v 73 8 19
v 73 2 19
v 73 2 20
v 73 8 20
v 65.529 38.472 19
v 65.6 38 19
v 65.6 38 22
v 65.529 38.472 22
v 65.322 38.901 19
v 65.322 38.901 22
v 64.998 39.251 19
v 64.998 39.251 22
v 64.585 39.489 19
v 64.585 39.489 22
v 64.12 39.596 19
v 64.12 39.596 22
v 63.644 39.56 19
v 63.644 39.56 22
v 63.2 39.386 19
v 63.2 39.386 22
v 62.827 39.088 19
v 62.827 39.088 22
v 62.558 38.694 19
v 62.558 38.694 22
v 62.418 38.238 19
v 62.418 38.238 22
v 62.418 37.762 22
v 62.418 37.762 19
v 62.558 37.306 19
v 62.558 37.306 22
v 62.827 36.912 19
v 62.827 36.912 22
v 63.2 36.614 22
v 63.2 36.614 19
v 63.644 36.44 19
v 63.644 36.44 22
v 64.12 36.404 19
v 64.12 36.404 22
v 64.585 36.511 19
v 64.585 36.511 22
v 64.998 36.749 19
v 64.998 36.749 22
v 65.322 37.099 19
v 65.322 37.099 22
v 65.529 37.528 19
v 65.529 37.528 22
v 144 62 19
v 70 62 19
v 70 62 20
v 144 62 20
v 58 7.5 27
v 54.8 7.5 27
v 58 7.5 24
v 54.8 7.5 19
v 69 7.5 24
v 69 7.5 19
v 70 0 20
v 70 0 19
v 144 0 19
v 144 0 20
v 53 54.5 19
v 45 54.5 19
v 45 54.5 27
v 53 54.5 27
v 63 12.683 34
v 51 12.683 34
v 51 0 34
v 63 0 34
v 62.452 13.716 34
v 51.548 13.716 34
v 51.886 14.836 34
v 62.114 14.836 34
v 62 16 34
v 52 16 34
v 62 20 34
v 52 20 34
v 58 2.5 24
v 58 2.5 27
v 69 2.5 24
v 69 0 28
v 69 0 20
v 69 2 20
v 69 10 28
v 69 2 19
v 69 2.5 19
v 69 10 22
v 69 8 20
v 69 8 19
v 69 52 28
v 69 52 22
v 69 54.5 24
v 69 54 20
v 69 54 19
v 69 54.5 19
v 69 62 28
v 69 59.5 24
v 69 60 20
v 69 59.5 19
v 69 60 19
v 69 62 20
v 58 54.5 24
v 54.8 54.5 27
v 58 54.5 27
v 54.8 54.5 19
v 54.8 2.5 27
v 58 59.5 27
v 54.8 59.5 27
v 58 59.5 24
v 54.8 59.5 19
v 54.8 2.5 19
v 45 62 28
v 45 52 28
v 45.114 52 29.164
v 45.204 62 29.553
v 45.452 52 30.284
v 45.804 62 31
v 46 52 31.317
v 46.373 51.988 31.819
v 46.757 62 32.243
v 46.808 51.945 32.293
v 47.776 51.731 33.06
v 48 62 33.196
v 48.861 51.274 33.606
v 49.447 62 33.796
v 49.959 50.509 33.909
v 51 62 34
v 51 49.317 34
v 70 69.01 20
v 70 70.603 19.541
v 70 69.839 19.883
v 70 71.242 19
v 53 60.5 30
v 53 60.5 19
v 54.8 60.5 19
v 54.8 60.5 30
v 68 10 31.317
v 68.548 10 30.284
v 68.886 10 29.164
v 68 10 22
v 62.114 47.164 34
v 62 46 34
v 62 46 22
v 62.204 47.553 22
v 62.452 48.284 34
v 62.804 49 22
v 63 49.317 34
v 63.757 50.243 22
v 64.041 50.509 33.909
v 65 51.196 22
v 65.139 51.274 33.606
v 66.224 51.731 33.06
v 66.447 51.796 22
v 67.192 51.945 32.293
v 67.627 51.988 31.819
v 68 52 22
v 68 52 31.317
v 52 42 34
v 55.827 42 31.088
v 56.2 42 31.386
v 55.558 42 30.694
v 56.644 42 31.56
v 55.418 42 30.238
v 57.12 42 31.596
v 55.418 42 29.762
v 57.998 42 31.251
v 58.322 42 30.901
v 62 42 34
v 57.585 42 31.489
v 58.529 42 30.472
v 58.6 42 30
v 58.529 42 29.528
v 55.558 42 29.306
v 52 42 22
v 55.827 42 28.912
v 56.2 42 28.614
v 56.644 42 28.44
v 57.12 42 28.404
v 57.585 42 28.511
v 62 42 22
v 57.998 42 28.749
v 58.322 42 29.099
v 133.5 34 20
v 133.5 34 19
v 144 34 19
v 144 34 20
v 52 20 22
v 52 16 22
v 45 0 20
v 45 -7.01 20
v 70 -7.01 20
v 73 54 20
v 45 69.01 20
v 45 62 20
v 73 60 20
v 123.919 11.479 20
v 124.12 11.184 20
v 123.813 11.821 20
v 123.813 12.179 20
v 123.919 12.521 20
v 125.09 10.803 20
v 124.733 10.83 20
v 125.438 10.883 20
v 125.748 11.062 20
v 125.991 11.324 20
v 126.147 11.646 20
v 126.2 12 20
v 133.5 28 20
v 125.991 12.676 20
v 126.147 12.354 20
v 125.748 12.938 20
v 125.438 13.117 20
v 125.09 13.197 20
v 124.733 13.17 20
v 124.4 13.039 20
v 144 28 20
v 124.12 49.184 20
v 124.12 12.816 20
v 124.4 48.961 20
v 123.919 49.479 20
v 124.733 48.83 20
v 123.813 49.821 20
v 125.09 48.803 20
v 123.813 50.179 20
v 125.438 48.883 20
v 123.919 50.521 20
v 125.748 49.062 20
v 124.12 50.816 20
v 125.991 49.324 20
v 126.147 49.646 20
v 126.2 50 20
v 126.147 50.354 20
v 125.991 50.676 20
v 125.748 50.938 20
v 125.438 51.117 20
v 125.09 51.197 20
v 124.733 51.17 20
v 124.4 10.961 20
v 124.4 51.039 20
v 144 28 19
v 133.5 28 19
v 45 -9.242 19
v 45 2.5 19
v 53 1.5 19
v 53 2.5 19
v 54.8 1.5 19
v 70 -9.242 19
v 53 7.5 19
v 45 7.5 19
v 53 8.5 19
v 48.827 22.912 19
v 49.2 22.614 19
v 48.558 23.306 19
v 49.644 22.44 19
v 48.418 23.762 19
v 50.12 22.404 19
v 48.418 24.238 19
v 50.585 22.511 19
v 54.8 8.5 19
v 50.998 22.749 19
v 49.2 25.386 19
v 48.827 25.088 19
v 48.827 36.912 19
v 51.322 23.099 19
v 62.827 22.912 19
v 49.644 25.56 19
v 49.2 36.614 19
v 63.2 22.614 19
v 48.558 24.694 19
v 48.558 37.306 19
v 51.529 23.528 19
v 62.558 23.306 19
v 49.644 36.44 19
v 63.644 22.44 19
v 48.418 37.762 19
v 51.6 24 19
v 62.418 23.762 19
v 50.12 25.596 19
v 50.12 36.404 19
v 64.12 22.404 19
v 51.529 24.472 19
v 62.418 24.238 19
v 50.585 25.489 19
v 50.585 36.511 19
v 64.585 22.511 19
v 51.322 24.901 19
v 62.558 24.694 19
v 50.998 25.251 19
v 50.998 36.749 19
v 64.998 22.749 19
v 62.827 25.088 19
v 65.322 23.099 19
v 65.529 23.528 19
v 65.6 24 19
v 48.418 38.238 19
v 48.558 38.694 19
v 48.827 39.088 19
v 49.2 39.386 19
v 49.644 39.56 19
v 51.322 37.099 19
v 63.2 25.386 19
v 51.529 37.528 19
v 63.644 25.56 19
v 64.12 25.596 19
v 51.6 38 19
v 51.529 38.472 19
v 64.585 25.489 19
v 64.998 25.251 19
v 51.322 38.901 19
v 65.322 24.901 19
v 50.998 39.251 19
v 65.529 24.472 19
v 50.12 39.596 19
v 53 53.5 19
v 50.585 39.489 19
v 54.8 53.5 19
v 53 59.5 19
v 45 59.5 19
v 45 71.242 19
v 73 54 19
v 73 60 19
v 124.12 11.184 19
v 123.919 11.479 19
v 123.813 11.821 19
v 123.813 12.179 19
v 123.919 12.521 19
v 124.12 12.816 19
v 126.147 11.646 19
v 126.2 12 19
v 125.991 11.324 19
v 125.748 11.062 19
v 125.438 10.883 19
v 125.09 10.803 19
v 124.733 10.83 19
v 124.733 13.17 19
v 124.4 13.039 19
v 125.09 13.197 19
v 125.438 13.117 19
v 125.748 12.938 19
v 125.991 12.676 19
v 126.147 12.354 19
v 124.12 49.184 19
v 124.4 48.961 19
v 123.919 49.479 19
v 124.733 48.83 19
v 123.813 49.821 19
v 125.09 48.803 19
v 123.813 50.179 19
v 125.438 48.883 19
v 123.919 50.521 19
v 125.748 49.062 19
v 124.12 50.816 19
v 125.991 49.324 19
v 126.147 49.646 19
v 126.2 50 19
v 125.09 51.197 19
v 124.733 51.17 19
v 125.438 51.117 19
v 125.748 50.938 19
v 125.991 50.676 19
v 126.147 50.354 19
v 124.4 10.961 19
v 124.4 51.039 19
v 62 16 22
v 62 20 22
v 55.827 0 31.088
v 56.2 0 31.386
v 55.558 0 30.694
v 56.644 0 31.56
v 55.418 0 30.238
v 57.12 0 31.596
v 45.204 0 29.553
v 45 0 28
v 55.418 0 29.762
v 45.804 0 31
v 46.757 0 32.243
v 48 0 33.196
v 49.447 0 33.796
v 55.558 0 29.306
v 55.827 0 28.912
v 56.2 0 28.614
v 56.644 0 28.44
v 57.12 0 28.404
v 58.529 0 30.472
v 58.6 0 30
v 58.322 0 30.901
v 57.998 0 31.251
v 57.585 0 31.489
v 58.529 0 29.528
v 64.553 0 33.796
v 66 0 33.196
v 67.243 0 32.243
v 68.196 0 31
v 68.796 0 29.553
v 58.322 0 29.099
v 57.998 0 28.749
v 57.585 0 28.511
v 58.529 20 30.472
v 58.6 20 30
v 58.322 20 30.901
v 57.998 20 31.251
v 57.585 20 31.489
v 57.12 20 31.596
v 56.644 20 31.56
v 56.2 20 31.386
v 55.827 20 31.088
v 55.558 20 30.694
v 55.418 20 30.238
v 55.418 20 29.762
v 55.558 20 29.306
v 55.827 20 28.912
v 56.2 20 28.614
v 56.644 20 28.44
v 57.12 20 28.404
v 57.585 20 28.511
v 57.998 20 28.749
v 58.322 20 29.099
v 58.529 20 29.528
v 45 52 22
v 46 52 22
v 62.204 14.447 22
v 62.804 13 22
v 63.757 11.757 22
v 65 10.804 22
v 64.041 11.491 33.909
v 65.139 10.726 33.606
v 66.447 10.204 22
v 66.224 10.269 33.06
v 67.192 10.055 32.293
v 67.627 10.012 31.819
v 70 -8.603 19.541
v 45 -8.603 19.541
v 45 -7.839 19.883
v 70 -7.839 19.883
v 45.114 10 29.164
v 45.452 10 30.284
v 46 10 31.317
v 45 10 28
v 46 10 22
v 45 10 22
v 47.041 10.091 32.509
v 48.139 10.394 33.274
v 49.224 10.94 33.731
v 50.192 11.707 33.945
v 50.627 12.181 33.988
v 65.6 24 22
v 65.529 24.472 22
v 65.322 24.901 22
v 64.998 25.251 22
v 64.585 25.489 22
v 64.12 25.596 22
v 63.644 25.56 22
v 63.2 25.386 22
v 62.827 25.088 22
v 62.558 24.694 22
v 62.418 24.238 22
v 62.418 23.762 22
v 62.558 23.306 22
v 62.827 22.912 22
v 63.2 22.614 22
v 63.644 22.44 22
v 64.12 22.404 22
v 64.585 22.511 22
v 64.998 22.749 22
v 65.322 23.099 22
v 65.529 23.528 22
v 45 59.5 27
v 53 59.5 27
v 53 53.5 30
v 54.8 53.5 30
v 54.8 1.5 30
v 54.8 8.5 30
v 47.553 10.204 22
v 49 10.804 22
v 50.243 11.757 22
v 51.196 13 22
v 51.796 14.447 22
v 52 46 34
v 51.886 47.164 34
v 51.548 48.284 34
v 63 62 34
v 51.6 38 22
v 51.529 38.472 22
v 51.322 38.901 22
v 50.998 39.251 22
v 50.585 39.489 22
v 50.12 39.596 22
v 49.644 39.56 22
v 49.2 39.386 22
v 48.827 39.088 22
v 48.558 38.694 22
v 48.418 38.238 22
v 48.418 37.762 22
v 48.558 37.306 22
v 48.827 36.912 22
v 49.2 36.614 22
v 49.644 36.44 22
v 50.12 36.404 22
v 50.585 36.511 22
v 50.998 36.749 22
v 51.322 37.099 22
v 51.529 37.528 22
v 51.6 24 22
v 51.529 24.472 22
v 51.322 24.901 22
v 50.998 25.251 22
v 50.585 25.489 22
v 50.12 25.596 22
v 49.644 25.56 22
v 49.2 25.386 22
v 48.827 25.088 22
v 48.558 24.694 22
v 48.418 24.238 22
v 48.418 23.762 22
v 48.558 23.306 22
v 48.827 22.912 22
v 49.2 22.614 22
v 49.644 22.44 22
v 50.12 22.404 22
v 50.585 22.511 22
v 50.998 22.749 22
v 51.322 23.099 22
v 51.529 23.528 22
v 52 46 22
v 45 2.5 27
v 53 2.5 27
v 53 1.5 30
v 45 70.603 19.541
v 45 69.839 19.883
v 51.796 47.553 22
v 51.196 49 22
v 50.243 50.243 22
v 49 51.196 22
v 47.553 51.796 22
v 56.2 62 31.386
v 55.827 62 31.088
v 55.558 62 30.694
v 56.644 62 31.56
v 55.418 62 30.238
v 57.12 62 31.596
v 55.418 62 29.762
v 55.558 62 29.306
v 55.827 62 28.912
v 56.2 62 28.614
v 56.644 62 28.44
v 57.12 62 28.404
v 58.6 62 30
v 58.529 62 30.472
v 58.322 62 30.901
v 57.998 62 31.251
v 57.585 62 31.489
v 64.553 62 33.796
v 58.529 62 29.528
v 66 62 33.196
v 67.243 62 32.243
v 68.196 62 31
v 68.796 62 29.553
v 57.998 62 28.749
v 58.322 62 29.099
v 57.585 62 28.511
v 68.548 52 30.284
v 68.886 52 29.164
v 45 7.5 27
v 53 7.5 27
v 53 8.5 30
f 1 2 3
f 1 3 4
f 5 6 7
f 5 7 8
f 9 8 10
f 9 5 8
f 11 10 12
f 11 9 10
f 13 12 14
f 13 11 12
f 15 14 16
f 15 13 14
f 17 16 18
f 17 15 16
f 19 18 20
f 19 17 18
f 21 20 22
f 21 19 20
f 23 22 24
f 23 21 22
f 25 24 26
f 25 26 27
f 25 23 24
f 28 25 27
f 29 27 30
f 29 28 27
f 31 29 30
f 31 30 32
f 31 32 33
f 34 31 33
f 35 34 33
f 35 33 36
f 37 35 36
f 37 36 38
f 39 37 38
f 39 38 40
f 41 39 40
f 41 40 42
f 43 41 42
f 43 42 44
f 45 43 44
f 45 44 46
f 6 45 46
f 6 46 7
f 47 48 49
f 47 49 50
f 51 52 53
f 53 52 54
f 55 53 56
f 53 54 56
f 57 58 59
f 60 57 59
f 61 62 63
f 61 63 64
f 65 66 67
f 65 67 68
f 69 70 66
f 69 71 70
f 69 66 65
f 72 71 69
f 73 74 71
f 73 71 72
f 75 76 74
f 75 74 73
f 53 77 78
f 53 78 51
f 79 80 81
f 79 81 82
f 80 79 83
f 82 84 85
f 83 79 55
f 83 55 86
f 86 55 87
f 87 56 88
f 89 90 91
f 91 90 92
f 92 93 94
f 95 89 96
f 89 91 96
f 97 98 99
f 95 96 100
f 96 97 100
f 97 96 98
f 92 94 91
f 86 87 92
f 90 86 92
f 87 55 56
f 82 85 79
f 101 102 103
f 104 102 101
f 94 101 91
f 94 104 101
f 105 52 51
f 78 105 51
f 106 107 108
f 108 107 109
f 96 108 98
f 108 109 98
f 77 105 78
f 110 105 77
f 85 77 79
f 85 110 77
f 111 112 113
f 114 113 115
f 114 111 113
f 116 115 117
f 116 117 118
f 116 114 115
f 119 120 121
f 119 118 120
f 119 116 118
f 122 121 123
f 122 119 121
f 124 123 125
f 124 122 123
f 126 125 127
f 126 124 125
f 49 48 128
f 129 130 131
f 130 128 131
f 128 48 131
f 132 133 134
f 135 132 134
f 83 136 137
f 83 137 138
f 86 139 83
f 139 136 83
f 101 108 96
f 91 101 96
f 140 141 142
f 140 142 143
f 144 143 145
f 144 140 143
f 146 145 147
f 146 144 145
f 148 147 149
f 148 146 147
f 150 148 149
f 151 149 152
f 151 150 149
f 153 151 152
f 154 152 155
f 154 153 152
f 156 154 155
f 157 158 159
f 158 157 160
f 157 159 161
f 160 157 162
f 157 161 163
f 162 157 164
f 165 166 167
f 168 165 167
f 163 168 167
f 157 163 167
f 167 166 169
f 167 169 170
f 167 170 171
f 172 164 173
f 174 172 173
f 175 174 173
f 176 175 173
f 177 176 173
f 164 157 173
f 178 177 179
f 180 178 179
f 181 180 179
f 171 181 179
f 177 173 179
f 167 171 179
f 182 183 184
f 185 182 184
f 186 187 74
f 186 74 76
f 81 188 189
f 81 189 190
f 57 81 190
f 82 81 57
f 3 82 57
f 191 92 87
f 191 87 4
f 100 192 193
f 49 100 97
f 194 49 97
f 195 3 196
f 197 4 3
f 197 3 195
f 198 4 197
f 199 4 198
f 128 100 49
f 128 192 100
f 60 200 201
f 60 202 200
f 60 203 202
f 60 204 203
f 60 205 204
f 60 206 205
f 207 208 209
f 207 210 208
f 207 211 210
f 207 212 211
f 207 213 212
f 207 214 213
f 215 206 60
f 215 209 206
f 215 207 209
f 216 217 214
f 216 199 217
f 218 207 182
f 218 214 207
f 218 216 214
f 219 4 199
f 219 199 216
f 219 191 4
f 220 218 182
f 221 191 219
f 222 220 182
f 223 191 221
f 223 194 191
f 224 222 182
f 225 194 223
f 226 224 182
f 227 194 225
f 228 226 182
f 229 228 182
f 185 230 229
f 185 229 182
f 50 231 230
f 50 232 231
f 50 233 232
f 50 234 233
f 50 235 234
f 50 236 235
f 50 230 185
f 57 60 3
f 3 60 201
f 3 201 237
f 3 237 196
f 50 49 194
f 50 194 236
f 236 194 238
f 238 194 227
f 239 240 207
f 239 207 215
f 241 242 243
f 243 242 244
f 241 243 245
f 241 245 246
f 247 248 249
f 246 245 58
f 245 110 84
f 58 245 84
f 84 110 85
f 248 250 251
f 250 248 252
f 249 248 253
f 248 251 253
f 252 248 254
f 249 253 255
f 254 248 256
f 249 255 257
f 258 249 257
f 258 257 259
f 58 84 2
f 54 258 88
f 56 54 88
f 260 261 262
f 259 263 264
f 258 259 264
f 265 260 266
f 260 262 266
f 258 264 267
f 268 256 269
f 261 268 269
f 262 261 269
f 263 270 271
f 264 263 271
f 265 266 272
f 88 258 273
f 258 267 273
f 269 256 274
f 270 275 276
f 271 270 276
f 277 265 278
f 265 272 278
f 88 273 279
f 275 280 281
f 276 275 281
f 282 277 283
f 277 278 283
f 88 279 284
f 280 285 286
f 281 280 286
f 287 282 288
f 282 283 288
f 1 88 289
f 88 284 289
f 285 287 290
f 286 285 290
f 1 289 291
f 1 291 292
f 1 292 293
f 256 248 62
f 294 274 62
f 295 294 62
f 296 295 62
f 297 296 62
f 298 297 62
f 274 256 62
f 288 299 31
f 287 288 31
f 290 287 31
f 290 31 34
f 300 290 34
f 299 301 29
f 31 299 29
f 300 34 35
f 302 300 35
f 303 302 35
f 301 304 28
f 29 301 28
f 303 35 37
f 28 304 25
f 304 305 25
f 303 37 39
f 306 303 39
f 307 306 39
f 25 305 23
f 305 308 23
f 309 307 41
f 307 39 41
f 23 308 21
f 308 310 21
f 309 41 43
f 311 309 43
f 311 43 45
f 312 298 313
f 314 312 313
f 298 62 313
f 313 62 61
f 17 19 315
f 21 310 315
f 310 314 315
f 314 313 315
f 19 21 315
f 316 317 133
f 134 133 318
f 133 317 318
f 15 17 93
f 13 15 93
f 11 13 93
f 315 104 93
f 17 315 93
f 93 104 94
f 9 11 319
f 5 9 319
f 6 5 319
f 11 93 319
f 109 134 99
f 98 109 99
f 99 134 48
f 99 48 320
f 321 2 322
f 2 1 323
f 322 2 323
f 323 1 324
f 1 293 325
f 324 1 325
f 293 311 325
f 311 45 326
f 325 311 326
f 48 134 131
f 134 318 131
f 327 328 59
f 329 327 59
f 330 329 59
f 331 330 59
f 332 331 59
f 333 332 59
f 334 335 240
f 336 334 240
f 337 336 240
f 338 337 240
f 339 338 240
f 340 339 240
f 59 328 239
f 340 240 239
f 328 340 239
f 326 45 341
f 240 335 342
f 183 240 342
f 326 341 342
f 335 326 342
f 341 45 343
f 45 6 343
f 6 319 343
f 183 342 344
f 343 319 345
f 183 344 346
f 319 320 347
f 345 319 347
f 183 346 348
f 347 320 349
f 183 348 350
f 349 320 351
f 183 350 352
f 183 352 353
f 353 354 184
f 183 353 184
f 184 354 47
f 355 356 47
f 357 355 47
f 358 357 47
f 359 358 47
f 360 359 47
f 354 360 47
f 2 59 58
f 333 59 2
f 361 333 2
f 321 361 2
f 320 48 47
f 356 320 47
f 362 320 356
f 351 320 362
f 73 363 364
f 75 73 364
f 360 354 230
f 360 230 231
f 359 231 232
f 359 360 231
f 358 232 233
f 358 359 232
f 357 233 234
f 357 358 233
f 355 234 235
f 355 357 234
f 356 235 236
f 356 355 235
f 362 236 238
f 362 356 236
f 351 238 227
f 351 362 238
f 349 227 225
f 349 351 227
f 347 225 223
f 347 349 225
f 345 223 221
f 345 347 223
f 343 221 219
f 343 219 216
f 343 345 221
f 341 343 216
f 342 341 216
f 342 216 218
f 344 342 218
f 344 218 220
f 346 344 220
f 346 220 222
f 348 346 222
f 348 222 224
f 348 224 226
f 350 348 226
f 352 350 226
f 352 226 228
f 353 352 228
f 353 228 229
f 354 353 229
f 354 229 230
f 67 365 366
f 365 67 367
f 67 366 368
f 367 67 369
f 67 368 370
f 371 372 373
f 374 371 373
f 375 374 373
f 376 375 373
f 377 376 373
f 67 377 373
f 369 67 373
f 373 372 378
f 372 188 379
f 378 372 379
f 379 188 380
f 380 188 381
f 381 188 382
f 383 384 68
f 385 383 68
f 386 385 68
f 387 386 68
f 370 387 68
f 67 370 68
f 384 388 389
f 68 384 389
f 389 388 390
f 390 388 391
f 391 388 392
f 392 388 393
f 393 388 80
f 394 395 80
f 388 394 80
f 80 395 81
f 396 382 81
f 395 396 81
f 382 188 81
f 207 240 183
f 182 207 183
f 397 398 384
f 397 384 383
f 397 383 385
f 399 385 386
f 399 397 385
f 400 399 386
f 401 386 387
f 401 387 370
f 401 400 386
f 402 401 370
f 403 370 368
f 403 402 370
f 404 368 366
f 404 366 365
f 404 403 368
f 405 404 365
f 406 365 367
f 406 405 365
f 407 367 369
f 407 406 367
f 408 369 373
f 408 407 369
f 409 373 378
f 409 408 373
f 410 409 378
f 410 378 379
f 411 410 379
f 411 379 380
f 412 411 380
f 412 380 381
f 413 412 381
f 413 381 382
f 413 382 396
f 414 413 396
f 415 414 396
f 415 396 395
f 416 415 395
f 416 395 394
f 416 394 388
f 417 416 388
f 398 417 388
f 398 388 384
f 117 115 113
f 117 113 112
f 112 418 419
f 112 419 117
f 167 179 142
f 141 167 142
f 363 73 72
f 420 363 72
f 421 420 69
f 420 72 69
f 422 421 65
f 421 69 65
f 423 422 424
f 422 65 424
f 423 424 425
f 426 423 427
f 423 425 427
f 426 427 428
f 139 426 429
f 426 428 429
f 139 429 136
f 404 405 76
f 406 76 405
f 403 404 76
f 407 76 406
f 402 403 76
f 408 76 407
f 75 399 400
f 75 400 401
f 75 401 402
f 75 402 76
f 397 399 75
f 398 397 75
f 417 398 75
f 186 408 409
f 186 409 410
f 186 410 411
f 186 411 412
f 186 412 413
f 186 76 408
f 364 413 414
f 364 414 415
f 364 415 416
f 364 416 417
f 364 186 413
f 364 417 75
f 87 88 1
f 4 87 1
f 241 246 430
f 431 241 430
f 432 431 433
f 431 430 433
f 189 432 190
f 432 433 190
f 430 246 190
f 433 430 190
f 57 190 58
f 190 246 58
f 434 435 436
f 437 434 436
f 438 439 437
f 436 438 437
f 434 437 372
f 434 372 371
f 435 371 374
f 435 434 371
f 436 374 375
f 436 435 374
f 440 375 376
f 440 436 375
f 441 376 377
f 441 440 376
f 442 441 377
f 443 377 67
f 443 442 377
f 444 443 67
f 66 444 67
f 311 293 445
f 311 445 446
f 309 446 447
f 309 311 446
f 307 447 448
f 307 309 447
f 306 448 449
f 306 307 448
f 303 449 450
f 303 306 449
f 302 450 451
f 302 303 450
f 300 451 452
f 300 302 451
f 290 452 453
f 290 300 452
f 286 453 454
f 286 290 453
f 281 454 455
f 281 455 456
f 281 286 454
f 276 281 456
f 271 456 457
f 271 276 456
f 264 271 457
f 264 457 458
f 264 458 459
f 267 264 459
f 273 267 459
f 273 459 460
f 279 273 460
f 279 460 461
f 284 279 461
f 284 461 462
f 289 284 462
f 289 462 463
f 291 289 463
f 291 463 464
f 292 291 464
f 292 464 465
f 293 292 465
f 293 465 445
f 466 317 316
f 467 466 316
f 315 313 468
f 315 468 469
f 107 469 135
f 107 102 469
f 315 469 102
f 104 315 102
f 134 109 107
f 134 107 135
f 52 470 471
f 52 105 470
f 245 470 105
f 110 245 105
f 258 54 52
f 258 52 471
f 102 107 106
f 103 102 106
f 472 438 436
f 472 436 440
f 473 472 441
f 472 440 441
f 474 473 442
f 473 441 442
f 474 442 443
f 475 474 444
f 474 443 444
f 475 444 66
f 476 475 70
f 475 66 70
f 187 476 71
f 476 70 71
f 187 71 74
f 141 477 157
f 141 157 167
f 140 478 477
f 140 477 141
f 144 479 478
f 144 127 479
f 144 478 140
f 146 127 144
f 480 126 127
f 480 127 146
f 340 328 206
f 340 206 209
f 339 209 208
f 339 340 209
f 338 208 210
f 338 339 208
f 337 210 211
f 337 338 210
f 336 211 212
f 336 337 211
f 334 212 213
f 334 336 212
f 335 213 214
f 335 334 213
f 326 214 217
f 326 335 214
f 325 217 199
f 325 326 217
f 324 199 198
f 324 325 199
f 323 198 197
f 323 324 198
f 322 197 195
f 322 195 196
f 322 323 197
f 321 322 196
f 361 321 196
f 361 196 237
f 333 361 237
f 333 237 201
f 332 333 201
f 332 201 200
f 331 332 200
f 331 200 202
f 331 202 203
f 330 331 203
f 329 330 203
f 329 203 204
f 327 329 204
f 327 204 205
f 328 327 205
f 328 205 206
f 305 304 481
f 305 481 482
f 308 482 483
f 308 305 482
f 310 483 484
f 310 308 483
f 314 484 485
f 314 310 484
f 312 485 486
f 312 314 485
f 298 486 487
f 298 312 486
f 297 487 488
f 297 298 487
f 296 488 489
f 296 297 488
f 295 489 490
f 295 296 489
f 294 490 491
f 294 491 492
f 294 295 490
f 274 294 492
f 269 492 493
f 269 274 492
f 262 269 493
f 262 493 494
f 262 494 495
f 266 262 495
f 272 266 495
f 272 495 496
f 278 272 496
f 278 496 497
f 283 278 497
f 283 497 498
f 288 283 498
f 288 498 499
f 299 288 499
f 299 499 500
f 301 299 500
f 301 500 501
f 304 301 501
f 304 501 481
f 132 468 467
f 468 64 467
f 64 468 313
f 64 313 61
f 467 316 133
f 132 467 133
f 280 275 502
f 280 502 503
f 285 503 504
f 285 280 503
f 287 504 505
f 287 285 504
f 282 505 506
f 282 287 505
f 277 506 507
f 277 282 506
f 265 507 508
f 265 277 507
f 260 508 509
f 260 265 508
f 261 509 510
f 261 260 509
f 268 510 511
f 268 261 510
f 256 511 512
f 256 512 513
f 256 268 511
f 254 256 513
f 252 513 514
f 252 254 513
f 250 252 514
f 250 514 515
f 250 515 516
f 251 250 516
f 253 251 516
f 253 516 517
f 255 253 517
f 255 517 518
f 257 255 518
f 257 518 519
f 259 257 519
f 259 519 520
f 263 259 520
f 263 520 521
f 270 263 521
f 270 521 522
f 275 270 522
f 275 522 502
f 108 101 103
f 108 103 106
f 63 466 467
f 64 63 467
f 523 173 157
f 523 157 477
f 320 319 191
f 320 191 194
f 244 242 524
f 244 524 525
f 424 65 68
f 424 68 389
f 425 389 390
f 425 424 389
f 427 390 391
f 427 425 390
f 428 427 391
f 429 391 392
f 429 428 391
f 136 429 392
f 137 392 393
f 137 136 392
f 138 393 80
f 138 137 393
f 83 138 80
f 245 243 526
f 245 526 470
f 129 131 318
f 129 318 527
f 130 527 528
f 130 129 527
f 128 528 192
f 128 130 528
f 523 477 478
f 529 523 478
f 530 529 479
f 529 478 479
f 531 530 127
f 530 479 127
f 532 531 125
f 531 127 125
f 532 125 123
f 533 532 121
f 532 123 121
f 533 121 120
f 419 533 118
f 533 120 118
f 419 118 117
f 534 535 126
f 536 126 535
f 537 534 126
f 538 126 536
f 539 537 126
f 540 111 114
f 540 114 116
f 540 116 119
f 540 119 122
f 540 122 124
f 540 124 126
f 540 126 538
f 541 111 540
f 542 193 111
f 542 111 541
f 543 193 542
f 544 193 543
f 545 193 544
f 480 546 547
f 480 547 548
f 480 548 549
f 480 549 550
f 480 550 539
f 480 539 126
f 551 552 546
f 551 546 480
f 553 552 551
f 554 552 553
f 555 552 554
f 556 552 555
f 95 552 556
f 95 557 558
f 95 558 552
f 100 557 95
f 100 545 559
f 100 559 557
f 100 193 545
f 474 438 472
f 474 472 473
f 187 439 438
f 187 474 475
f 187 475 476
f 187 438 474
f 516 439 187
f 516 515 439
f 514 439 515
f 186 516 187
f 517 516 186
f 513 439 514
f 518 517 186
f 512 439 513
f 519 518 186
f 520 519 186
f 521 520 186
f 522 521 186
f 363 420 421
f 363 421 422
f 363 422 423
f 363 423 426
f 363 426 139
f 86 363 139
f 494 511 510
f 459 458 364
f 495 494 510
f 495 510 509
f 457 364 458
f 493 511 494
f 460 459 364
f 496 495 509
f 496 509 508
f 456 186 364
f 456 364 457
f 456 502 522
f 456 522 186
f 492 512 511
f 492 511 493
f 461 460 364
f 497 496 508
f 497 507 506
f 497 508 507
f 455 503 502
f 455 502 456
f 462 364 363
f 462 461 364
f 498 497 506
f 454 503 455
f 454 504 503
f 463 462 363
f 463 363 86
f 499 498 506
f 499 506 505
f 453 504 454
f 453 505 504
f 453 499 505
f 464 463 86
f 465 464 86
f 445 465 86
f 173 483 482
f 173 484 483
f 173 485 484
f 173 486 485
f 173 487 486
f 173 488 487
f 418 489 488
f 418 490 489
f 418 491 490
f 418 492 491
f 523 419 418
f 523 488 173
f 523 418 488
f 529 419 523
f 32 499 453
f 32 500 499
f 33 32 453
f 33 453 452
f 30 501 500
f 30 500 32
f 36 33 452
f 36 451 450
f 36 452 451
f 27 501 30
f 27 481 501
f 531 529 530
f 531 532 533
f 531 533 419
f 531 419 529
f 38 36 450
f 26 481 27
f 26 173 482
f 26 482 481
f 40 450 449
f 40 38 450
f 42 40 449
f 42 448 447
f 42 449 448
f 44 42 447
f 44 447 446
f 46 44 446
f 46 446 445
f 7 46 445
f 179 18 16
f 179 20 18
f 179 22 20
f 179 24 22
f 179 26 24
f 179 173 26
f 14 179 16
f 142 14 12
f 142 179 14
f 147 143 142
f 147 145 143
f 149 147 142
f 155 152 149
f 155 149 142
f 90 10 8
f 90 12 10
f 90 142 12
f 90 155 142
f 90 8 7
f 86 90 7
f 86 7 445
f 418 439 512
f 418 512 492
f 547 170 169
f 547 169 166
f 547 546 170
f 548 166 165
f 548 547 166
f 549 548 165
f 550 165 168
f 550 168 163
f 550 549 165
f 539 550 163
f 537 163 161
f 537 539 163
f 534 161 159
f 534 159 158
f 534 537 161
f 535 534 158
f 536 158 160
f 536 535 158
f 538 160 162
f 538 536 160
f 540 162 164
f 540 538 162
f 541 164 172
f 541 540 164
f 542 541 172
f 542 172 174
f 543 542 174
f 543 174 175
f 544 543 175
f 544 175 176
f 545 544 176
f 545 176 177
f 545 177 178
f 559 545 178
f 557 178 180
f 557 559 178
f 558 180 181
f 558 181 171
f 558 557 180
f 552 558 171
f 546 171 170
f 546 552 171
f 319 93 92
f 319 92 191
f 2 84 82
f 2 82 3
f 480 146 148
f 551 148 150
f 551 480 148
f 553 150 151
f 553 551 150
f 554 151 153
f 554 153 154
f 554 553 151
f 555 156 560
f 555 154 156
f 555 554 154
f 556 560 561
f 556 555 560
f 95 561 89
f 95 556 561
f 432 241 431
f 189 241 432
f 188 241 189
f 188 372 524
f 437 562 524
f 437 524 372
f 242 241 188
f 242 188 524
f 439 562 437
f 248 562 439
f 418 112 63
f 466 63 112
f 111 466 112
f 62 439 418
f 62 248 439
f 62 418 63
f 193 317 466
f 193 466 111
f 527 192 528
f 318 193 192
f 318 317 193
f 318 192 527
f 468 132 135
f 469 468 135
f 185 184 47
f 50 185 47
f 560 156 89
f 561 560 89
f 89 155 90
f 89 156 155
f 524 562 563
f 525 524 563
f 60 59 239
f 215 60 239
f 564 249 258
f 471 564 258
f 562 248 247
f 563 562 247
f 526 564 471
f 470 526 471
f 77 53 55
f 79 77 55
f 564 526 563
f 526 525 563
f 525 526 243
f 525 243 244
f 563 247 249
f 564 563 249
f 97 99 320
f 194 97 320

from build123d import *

# Parameters (mm, degrees)
CYLINDER455_R     = 1.2
CYLINDER455_DEPTH = 4
CYLINDER454_R     = 1.2
CYLINDER454_DEPTH = 4
BOX307_W          = 4
BOX307_H          = 6
BOX307_DEPTH      = 1
BOX308_W          = 10.5
BOX308_H          = 6
BOX308_DEPTH      = 1
BOX306_W          = 4
BOX306_H          = 6
BOX306_DEPTH      = 1
BOX305_W          = 75
BOX305_H          = 62
BOX305_DEPTH      = 1
BOX304_W          = 25
BOX304_H          = 62
BOX304_DEPTH      = 1
BOX303_W          = 25
BOX303_H          = 82
BOX303_DEPTH      = 2
BOX302_W          = 25
BOX302_H          = 82
BOX302_DEPTH      = 3
FILLET108_R       = 2.99
CYLINDER349_R     = 1.6
CYLINDER349_DEPTH = 10
CYLINDER351_R     = 1.6
CYLINDER351_DEPTH = 10
CYLINDER350_R     = 1.6
CYLINDER350_DEPTH = 10
CYLINDER347_R     = 1.6
CYLINDER347_DEPTH = 10
CYLINDER353_R     = 1.6
CYLINDER353_DEPTH = 10
BOX241_W          = 19
BOX241_H          = 5
BOX241_DEPTH      = 5
BOX242_W          = 4
BOX242_H          = 5
BOX242_DEPTH      = 8
BOX243_W          = 1.8
BOX243_H          = 7
BOX243_DEPTH      = 11
BOX244_W          = 8
BOX244_H          = 5
BOX244_DEPTH      = 8
BOX245_W          = 24
BOX245_H          = 10
BOX245_DEPTH      = 15
FILLET095_R       = 6
CYLINDER352_R     = 1.6
CYLINDER352_DEPTH = 10
BOX240_W          = 19
BOX240_H          = 5
BOX240_DEPTH      = 5
BOX239_W          = 4
BOX239_H          = 5
BOX239_DEPTH      = 8
BOX238_W          = 1.8
BOX238_H          = 7
BOX238_DEPTH      = 11
BOX236_W          = 8
BOX236_H          = 5
BOX236_DEPTH      = 8
BOX237_W          = 24
BOX237_H          = 10
BOX237_DEPTH      = 15
FILLET094_R       = 6
CYLINDER355_R     = 1.6
CYLINDER355_DEPTH = 10
BOX247_W          = 10
BOX247_H          = 10
BOX247_DEPTH      = 12
CYLINDER354_R     = 1.6
CYLINDER354_DEPTH = 10
BOX246_W          = 10
BOX246_H          = 10
BOX246_DEPTH      = 12
BOX235_W          = 24
BOX235_H          = 42
BOX235_DEPTH      = 3
FILLET109_R       = 6


with BuildPart() as cylinder455:
    # Cylinder455 → Cylinder455 (new body)
    with BuildSketch(Plane(origin=(125, 50, 15), x_dir=(1, 0, 0), z_dir=(0, 0, 1))):
        Circle(CYLINDER455_R)
    extrude(amount=CYLINDER455_DEPTH)


with BuildPart() as fusion409:
    # Cylinder454 → Cylinder454 (new body)
    with BuildSketch(Plane(origin=(125, 12, 15), x_dir=(1, 0, 0), z_dir=(0, 0, 1))):
        Circle(CYLINDER454_R)
    extrude(amount=CYLINDER454_DEPTH)

    # Fusion409: union Cylinder455
    add(cylinder455.part)


with BuildPart() as fusion409_1:
    # Fusion409 placement: moved
    add(fusion409.part.moved(Location((0, 0, 1))))


with BuildPart() as cube378:
    # Box307 → Box307 (new body)
    with BuildSketch(Plane(origin=(69, 54, 19), x_dir=(1, 0, 0), z_dir=(0, 0, 1))):
        with Locations((2, 3)):
            Rectangle(BOX307_W, BOX307_H)
    extrude(amount=BOX307_DEPTH)


with BuildPart() as cube379:
    # Box308 → Box308 (new body)
    with BuildSketch(Plane(origin=(133.5, 28, 19), x_dir=(1, 0, 0), z_dir=(0, 0, 1))):
        with Locations((5.25, 3)):
            Rectangle(BOX308_W, BOX308_H)
    extrude(amount=BOX308_DEPTH)


with BuildPart() as fusion410:
    # Box306 → Box306 (new body)
    with BuildSketch(Plane(origin=(69, 2, 19), x_dir=(1, 0, 0), z_dir=(0, 0, 1))):
        with Locations((2, 3)):
            Rectangle(BOX306_W, BOX306_H)
    extrude(amount=BOX306_DEPTH)

    # Fusion408: union Cube378, Cube379
    add(cube378.part)
    add(cube379.part)

    # Fusion410: union Fusion409
    add(fusion409_1.part)


with BuildPart() as cut303:
    # Box305 → Box305 (new body)
    with BuildSketch(Plane(origin=(69, 0, 19), x_dir=(1, 0, 0), z_dir=(0, 0, 1))):
        with Locations((37.5, 31)):
            Rectangle(BOX305_W, BOX305_H)
    extrude(amount=BOX305_DEPTH)

    # Cut303: cut Fusion410
    add(fusion410.part, mode=Mode.SUBTRACT)


with BuildPart() as cube375:
    # Box304 → Box304 (new body)
    with BuildSketch(Plane(origin=(45, 0, 19), x_dir=(1, 0, 0), z_dir=(0, 0, 1))):
        with Locations((12.5, 31)):
            Rectangle(BOX304_W, BOX304_H)
    extrude(amount=BOX304_DEPTH)


with BuildPart() as cube374:
    # Box303 → Box303 (new body)
    with BuildSketch(Plane(origin=(45, -10, 17), x_dir=(1, 0, 0), z_dir=(0, 0, 1))):
        with Locations((12.5, 41)):
            Rectangle(BOX303_W, BOX303_H)
    extrude(amount=BOX303_DEPTH)


with BuildPart() as fusion411:
    # Box302 → Box302 (new body)
    with BuildSketch(Plane(origin=(45, -10, 17), x_dir=(1, 0, 0), z_dir=(0, 0, 1))):
        with Locations((12.5, 41)):
            Rectangle(BOX302_W, BOX302_H)
    extrude(amount=BOX302_DEPTH)

    # Fillet108
    fillet108_edges = [fusion411.edges().sort_by_distance(p)[0] for p in [
        (57.5, -10, 20),
        (57.5, 72, 20),
    ]]
    fillet(fillet108_edges, radius=FILLET108_R)

    # Cut301: cut Cube374
    add(cube374.part, mode=Mode.SUBTRACT)

    # Cut302: cut Cube375
    add(cube375.part, mode=Mode.SUBTRACT)

    # Fusion411: union Cut303
    add(cut303.part)


with BuildPart() as cylinder349:
    # Cylinder349 → Cylinder349 (new body)
    with BuildSketch(Plane(origin=(50, 24, 12), x_dir=(1, 0, 0), z_dir=(0, 0, 1))):
        Circle(CYLINDER349_R)
    extrude(amount=CYLINDER349_DEPTH)


with BuildPart() as cylinder351:
    # Cylinder351 → Cylinder351 (new body)
    with BuildSketch(Plane(origin=(64, 24, 12), x_dir=(1, 0, 0), z_dir=(0, 0, 1))):
        Circle(CYLINDER351_R)
    extrude(amount=CYLINDER351_DEPTH)


with BuildPart() as cylinder350:
    # Cylinder350 → Cylinder350 (new body)
    with BuildSketch(Plane(origin=(64, 38, 12), x_dir=(1, 0, 0), z_dir=(0, 0, 1))):
        Circle(CYLINDER350_R)
    extrude(amount=CYLINDER350_DEPTH)


with BuildPart() as fusion300:
    # Cylinder347 → Cylinder347 (new body)
    with BuildSketch(Plane(origin=(50, 38, 12), x_dir=(1, 0, 0), z_dir=(0, 0, 1))):
        Circle(CYLINDER347_R)
    extrude(amount=CYLINDER347_DEPTH)

    # Fusion300: union Cylinder349, Cylinder351, Cylinder350
    add(cylinder349.part)
    add(cylinder351.part)
    add(cylinder350.part)


with BuildPart() as cylinder353:
    # Cylinder353 → Cylinder353 (new body)
    with BuildSketch(Plane(origin=(57, 52, 30), x_dir=(1, 0, 0), z_dir=(0, -1, 0))):
        Circle(CYLINDER353_R)
    extrude(amount=CYLINDER353_DEPTH)


with BuildPart() as cube321:
    # Box241 → Box241 (new body)
    with BuildSketch(Plane(origin=(54, 44.5, 19), x_dir=(1, 0, 0), z_dir=(0, 0, 1))):
        with Locations((9.5, 2.5)):
            Rectangle(BOX241_W, BOX241_H)
    extrude(amount=BOX241_DEPTH)


with BuildPart() as cube322:
    # Box242 → Box242 (new body)
    with BuildSketch(Plane(origin=(54, 44.5, 19), x_dir=(1, 0, 0), z_dir=(0, 0, 1))):
        with Locations((2, 2.5)):
            Rectangle(BOX242_W, BOX242_H)
    extrude(amount=BOX242_DEPTH)


with BuildPart() as cube323:
    # Box243 → Box243 (new body)
    with BuildSketch(Plane(origin=(53, 43.5, 19), x_dir=(1, 0, 0), z_dir=(0, 0, 1))):
        with Locations((0.9, 3.5)):
            Rectangle(BOX243_W, BOX243_H)
    extrude(amount=BOX243_DEPTH)


with BuildPart() as cube324:
    # Box244 → Box244 (new body)
    with BuildSketch(Plane(origin=(45, 44.5, 19), x_dir=(1, 0, 0), z_dir=(0, 0, 1))):
        with Locations((4, 2.5)):
            Rectangle(BOX244_W, BOX244_H)
    extrude(amount=BOX244_DEPTH)


with BuildPart() as fillet095:
    # Box245 → Box245 (new body)
    with BuildSketch(Plane(origin=(45, 42, 19), x_dir=(1, 0, 0), z_dir=(0, 0, 1))):
        with Locations((12, 5)):
            Rectangle(BOX245_W, BOX245_H)
    extrude(amount=BOX245_DEPTH)

    # Cut250: cut Cube324
    add(cube324.part, mode=Mode.SUBTRACT)

    # Cut254: cut Cube323
    add(cube323.part, mode=Mode.SUBTRACT)

    # Cut253: cut Cube322
    add(cube322.part, mode=Mode.SUBTRACT)

    # Cut251: cut Cube321
    add(cube321.part, mode=Mode.SUBTRACT)

    # Cut252: cut Cylinder353
    add(cylinder353.part, mode=Mode.SUBTRACT)

    # Fillet095
    fillet095_edges = [fillet095.edges().sort_by_distance(p)[0] for p in [
        (45, 47, 34),
        (69, 47, 34),
    ]]
    fillet(fillet095_edges, radius=FILLET095_R)


with BuildPart() as fillet095_1:
    # Fillet095 placement: moved
    add(fillet095.part.moved(Location((0, 10, 0))))


with BuildPart() as cylinder352:
    # Cylinder352 → Cylinder352 (new body)
    with BuildSketch(Plane(origin=(57, 52, 30), x_dir=(1, 0, 0), z_dir=(0, -1, 0))):
        Circle(CYLINDER352_R)
    extrude(amount=CYLINDER352_DEPTH)


with BuildPart() as cube320:
    # Box240 → Box240 (new body)
    with BuildSketch(Plane(origin=(54, 44.5, 19), x_dir=(1, 0, 0), z_dir=(0, 0, 1))):
        with Locations((9.5, 2.5)):
            Rectangle(BOX240_W, BOX240_H)
    extrude(amount=BOX240_DEPTH)


with BuildPart() as cube319:
    # Box239 → Box239 (new body)
    with BuildSketch(Plane(origin=(54, 44.5, 19), x_dir=(1, 0, 0), z_dir=(0, 0, 1))):
        with Locations((2, 2.5)):
            Rectangle(BOX239_W, BOX239_H)
    extrude(amount=BOX239_DEPTH)


with BuildPart() as cube318:
    # Box238 → Box238 (new body)
    with BuildSketch(Plane(origin=(53, 43.5, 19), x_dir=(1, 0, 0), z_dir=(0, 0, 1))):
        with Locations((0.9, 3.5)):
            Rectangle(BOX238_W, BOX238_H)
    extrude(amount=BOX238_DEPTH)


with BuildPart() as cube316:
    # Box236 → Box236 (new body)
    with BuildSketch(Plane(origin=(45, 44.5, 19), x_dir=(1, 0, 0), z_dir=(0, 0, 1))):
        with Locations((4, 2.5)):
            Rectangle(BOX236_W, BOX236_H)
    extrude(amount=BOX236_DEPTH)


with BuildPart() as fillet094:
    # Box237 → Box237 (new body)
    with BuildSketch(Plane(origin=(45, 42, 19), x_dir=(1, 0, 0), z_dir=(0, 0, 1))):
        with Locations((12, 5)):
            Rectangle(BOX237_W, BOX237_H)
    extrude(amount=BOX237_DEPTH)

    # Cut245: cut Cube316
    add(cube316.part, mode=Mode.SUBTRACT)

    # Cut246: cut Cube318
    add(cube318.part, mode=Mode.SUBTRACT)

    # Cut247: cut Cube319
    add(cube319.part, mode=Mode.SUBTRACT)

    # Cut248: cut Cube320
    add(cube320.part, mode=Mode.SUBTRACT)

    # Cut249: cut Cylinder352
    add(cylinder352.part, mode=Mode.SUBTRACT)

    # Fillet094
    fillet094_edges = [fillet094.edges().sort_by_distance(p)[0] for p in [
        (45, 47, 34),
        (69, 47, 34),
    ]]
    fillet(fillet094_edges, radius=FILLET094_R)


with BuildPart() as fillet094_1:
    # Fillet094 placement: moved
    add(fillet094.part.moved(Location((0, -42, 0))))


with BuildPart() as cylinder355:
    # Cylinder355 → Cylinder355 (new body)
    with BuildSketch(Plane(origin=(57, 52, 30), x_dir=(1, 0, 0), z_dir=(0, -1, 0))):
        Circle(CYLINDER355_R)
    extrude(amount=CYLINDER355_DEPTH)


with BuildPart() as cut256:
    # Box247 → Box247 (new body)
    with BuildSketch(Plane(origin=(52, 42, 22), x_dir=(1, 0, 0), z_dir=(0, 0, 1))):
        with Locations((5, 5)):
            Rectangle(BOX247_W, BOX247_H)
    extrude(amount=BOX247_DEPTH)

    # Cut256: cut Cylinder355
    add(cylinder355.part, mode=Mode.SUBTRACT)


with BuildPart() as cut256_1:
    # Cut256 placement: moved
    add(cut256.part.moved(Location((0, -32, 0))))


with BuildPart() as cylinder354:
    # Cylinder354 → Cylinder354 (new body)
    with BuildSketch(Plane(origin=(57, 52, 30), x_dir=(1, 0, 0), z_dir=(0, -1, 0))):
        Circle(CYLINDER354_R)
    extrude(amount=CYLINDER354_DEPTH)


with BuildPart() as cut255:
    # Box246 → Box246 (new body)
    with BuildSketch(Plane(origin=(52, 42, 22), x_dir=(1, 0, 0), z_dir=(0, 0, 1))):
        with Locations((5, 5)):
            Rectangle(BOX246_W, BOX246_H)
    extrude(amount=BOX246_DEPTH)

    # Cut255: cut Cylinder354
    add(cylinder354.part, mode=Mode.SUBTRACT)


with BuildPart() as fake_cylinder_holder_wide:
    # Box235 → Box235 (new body)
    with BuildSketch(Plane(origin=(45, 10, 19), x_dir=(1, 0, 0), z_dir=(0, 0, 1))):
        with Locations((12, 21)):
            Rectangle(BOX235_W, BOX235_H)
    extrude(amount=BOX235_DEPTH)

    # Fusion301: union Fillet095, Fillet094, Cut256, Cut255
    add(fillet095_1.part)
    add(fillet094_1.part)
    add(cut256_1.part)
    add(cut255.part)

    # Cut257: cut Fusion300
    add(fusion300.part, mode=Mode.SUBTRACT)

    # Fillet109
    fillet109_edges = [fake_cylinder_holder_wide.edges().sort_by_distance(p)[0] for p in [
        (62, 52, 28),
        (62, 10, 28),
        (52, 10, 28),
        (52, 52, 28),
    ]]
    fillet(fillet109_edges, radius=FILLET109_R)

    # Fusion412: union Fusion411
    add(fusion411.part)


solid = fake_cylinder_holder_wide.part
